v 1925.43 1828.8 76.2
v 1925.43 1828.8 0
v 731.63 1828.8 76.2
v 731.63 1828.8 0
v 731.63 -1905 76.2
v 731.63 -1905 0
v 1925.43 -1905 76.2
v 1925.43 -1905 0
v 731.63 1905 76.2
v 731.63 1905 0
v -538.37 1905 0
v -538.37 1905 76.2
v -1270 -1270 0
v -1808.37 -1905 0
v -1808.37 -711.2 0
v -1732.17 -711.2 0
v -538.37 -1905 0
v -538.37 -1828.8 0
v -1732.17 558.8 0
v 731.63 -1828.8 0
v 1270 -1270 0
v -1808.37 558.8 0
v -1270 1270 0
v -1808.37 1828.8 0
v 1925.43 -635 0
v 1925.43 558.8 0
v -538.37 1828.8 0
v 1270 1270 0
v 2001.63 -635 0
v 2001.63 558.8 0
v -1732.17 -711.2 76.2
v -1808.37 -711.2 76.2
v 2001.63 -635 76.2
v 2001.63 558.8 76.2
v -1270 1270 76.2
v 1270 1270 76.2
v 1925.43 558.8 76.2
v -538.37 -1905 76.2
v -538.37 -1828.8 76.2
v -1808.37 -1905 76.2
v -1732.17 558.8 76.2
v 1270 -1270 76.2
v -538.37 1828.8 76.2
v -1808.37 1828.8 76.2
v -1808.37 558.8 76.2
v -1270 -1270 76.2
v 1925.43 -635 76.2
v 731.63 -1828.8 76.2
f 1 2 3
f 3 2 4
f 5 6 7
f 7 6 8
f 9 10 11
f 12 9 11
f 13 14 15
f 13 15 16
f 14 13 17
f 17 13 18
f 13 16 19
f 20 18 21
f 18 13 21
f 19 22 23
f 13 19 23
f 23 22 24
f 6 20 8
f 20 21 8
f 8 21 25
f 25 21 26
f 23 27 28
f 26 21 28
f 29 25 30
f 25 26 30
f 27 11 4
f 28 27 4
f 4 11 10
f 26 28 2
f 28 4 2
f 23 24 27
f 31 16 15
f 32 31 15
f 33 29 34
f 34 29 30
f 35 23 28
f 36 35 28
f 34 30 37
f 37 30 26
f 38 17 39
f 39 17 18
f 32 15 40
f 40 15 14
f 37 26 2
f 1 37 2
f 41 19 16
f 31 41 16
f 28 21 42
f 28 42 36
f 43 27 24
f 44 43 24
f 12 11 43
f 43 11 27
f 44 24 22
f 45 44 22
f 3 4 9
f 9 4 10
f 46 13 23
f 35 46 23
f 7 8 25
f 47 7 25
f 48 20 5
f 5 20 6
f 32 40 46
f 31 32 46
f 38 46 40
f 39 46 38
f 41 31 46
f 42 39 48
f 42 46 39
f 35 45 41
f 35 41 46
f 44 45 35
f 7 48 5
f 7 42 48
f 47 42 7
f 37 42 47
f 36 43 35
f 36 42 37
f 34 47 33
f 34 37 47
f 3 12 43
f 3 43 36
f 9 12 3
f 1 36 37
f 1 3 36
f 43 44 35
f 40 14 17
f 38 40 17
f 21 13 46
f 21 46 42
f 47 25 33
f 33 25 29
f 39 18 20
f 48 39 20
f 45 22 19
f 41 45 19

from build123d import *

# Parameters (mm, degrees)
F0_W     = 2540
F0_H     = 2540
F1_DEPTH = 76.2


with BuildPart() as f1:
    # F0 (on Top) → F1 (new body)
    with BuildSketch(Plane.XY):
        Polygon((731.630458, 1828.8), (731.630458, 1905), (-538.369542, 1905), (-538.369542, 1828.8), (-1808.369542, 1828.8), (-1808.369542, 558.8), (-1732.169542, 558.8), (-1732.169542, -711.2), (-1808.369542, -711.2), (-1808.369542, -1905), (-538.369542, -1905), (-538.369542, -1828.8), (731.630458, -1828.8), (731.630458, -1905), (1925.430458, -1905), (1925.430458, -635), (2001.630458, -635), (2001.630458, 558.8), (1925.430458, 558.8), (1925.430458, 1828.8), align=None)
        Rectangle(F0_W, F0_H, mode=Mode.SUBTRACT)
    extrude(amount=F1_DEPTH)


solid = f1.part
